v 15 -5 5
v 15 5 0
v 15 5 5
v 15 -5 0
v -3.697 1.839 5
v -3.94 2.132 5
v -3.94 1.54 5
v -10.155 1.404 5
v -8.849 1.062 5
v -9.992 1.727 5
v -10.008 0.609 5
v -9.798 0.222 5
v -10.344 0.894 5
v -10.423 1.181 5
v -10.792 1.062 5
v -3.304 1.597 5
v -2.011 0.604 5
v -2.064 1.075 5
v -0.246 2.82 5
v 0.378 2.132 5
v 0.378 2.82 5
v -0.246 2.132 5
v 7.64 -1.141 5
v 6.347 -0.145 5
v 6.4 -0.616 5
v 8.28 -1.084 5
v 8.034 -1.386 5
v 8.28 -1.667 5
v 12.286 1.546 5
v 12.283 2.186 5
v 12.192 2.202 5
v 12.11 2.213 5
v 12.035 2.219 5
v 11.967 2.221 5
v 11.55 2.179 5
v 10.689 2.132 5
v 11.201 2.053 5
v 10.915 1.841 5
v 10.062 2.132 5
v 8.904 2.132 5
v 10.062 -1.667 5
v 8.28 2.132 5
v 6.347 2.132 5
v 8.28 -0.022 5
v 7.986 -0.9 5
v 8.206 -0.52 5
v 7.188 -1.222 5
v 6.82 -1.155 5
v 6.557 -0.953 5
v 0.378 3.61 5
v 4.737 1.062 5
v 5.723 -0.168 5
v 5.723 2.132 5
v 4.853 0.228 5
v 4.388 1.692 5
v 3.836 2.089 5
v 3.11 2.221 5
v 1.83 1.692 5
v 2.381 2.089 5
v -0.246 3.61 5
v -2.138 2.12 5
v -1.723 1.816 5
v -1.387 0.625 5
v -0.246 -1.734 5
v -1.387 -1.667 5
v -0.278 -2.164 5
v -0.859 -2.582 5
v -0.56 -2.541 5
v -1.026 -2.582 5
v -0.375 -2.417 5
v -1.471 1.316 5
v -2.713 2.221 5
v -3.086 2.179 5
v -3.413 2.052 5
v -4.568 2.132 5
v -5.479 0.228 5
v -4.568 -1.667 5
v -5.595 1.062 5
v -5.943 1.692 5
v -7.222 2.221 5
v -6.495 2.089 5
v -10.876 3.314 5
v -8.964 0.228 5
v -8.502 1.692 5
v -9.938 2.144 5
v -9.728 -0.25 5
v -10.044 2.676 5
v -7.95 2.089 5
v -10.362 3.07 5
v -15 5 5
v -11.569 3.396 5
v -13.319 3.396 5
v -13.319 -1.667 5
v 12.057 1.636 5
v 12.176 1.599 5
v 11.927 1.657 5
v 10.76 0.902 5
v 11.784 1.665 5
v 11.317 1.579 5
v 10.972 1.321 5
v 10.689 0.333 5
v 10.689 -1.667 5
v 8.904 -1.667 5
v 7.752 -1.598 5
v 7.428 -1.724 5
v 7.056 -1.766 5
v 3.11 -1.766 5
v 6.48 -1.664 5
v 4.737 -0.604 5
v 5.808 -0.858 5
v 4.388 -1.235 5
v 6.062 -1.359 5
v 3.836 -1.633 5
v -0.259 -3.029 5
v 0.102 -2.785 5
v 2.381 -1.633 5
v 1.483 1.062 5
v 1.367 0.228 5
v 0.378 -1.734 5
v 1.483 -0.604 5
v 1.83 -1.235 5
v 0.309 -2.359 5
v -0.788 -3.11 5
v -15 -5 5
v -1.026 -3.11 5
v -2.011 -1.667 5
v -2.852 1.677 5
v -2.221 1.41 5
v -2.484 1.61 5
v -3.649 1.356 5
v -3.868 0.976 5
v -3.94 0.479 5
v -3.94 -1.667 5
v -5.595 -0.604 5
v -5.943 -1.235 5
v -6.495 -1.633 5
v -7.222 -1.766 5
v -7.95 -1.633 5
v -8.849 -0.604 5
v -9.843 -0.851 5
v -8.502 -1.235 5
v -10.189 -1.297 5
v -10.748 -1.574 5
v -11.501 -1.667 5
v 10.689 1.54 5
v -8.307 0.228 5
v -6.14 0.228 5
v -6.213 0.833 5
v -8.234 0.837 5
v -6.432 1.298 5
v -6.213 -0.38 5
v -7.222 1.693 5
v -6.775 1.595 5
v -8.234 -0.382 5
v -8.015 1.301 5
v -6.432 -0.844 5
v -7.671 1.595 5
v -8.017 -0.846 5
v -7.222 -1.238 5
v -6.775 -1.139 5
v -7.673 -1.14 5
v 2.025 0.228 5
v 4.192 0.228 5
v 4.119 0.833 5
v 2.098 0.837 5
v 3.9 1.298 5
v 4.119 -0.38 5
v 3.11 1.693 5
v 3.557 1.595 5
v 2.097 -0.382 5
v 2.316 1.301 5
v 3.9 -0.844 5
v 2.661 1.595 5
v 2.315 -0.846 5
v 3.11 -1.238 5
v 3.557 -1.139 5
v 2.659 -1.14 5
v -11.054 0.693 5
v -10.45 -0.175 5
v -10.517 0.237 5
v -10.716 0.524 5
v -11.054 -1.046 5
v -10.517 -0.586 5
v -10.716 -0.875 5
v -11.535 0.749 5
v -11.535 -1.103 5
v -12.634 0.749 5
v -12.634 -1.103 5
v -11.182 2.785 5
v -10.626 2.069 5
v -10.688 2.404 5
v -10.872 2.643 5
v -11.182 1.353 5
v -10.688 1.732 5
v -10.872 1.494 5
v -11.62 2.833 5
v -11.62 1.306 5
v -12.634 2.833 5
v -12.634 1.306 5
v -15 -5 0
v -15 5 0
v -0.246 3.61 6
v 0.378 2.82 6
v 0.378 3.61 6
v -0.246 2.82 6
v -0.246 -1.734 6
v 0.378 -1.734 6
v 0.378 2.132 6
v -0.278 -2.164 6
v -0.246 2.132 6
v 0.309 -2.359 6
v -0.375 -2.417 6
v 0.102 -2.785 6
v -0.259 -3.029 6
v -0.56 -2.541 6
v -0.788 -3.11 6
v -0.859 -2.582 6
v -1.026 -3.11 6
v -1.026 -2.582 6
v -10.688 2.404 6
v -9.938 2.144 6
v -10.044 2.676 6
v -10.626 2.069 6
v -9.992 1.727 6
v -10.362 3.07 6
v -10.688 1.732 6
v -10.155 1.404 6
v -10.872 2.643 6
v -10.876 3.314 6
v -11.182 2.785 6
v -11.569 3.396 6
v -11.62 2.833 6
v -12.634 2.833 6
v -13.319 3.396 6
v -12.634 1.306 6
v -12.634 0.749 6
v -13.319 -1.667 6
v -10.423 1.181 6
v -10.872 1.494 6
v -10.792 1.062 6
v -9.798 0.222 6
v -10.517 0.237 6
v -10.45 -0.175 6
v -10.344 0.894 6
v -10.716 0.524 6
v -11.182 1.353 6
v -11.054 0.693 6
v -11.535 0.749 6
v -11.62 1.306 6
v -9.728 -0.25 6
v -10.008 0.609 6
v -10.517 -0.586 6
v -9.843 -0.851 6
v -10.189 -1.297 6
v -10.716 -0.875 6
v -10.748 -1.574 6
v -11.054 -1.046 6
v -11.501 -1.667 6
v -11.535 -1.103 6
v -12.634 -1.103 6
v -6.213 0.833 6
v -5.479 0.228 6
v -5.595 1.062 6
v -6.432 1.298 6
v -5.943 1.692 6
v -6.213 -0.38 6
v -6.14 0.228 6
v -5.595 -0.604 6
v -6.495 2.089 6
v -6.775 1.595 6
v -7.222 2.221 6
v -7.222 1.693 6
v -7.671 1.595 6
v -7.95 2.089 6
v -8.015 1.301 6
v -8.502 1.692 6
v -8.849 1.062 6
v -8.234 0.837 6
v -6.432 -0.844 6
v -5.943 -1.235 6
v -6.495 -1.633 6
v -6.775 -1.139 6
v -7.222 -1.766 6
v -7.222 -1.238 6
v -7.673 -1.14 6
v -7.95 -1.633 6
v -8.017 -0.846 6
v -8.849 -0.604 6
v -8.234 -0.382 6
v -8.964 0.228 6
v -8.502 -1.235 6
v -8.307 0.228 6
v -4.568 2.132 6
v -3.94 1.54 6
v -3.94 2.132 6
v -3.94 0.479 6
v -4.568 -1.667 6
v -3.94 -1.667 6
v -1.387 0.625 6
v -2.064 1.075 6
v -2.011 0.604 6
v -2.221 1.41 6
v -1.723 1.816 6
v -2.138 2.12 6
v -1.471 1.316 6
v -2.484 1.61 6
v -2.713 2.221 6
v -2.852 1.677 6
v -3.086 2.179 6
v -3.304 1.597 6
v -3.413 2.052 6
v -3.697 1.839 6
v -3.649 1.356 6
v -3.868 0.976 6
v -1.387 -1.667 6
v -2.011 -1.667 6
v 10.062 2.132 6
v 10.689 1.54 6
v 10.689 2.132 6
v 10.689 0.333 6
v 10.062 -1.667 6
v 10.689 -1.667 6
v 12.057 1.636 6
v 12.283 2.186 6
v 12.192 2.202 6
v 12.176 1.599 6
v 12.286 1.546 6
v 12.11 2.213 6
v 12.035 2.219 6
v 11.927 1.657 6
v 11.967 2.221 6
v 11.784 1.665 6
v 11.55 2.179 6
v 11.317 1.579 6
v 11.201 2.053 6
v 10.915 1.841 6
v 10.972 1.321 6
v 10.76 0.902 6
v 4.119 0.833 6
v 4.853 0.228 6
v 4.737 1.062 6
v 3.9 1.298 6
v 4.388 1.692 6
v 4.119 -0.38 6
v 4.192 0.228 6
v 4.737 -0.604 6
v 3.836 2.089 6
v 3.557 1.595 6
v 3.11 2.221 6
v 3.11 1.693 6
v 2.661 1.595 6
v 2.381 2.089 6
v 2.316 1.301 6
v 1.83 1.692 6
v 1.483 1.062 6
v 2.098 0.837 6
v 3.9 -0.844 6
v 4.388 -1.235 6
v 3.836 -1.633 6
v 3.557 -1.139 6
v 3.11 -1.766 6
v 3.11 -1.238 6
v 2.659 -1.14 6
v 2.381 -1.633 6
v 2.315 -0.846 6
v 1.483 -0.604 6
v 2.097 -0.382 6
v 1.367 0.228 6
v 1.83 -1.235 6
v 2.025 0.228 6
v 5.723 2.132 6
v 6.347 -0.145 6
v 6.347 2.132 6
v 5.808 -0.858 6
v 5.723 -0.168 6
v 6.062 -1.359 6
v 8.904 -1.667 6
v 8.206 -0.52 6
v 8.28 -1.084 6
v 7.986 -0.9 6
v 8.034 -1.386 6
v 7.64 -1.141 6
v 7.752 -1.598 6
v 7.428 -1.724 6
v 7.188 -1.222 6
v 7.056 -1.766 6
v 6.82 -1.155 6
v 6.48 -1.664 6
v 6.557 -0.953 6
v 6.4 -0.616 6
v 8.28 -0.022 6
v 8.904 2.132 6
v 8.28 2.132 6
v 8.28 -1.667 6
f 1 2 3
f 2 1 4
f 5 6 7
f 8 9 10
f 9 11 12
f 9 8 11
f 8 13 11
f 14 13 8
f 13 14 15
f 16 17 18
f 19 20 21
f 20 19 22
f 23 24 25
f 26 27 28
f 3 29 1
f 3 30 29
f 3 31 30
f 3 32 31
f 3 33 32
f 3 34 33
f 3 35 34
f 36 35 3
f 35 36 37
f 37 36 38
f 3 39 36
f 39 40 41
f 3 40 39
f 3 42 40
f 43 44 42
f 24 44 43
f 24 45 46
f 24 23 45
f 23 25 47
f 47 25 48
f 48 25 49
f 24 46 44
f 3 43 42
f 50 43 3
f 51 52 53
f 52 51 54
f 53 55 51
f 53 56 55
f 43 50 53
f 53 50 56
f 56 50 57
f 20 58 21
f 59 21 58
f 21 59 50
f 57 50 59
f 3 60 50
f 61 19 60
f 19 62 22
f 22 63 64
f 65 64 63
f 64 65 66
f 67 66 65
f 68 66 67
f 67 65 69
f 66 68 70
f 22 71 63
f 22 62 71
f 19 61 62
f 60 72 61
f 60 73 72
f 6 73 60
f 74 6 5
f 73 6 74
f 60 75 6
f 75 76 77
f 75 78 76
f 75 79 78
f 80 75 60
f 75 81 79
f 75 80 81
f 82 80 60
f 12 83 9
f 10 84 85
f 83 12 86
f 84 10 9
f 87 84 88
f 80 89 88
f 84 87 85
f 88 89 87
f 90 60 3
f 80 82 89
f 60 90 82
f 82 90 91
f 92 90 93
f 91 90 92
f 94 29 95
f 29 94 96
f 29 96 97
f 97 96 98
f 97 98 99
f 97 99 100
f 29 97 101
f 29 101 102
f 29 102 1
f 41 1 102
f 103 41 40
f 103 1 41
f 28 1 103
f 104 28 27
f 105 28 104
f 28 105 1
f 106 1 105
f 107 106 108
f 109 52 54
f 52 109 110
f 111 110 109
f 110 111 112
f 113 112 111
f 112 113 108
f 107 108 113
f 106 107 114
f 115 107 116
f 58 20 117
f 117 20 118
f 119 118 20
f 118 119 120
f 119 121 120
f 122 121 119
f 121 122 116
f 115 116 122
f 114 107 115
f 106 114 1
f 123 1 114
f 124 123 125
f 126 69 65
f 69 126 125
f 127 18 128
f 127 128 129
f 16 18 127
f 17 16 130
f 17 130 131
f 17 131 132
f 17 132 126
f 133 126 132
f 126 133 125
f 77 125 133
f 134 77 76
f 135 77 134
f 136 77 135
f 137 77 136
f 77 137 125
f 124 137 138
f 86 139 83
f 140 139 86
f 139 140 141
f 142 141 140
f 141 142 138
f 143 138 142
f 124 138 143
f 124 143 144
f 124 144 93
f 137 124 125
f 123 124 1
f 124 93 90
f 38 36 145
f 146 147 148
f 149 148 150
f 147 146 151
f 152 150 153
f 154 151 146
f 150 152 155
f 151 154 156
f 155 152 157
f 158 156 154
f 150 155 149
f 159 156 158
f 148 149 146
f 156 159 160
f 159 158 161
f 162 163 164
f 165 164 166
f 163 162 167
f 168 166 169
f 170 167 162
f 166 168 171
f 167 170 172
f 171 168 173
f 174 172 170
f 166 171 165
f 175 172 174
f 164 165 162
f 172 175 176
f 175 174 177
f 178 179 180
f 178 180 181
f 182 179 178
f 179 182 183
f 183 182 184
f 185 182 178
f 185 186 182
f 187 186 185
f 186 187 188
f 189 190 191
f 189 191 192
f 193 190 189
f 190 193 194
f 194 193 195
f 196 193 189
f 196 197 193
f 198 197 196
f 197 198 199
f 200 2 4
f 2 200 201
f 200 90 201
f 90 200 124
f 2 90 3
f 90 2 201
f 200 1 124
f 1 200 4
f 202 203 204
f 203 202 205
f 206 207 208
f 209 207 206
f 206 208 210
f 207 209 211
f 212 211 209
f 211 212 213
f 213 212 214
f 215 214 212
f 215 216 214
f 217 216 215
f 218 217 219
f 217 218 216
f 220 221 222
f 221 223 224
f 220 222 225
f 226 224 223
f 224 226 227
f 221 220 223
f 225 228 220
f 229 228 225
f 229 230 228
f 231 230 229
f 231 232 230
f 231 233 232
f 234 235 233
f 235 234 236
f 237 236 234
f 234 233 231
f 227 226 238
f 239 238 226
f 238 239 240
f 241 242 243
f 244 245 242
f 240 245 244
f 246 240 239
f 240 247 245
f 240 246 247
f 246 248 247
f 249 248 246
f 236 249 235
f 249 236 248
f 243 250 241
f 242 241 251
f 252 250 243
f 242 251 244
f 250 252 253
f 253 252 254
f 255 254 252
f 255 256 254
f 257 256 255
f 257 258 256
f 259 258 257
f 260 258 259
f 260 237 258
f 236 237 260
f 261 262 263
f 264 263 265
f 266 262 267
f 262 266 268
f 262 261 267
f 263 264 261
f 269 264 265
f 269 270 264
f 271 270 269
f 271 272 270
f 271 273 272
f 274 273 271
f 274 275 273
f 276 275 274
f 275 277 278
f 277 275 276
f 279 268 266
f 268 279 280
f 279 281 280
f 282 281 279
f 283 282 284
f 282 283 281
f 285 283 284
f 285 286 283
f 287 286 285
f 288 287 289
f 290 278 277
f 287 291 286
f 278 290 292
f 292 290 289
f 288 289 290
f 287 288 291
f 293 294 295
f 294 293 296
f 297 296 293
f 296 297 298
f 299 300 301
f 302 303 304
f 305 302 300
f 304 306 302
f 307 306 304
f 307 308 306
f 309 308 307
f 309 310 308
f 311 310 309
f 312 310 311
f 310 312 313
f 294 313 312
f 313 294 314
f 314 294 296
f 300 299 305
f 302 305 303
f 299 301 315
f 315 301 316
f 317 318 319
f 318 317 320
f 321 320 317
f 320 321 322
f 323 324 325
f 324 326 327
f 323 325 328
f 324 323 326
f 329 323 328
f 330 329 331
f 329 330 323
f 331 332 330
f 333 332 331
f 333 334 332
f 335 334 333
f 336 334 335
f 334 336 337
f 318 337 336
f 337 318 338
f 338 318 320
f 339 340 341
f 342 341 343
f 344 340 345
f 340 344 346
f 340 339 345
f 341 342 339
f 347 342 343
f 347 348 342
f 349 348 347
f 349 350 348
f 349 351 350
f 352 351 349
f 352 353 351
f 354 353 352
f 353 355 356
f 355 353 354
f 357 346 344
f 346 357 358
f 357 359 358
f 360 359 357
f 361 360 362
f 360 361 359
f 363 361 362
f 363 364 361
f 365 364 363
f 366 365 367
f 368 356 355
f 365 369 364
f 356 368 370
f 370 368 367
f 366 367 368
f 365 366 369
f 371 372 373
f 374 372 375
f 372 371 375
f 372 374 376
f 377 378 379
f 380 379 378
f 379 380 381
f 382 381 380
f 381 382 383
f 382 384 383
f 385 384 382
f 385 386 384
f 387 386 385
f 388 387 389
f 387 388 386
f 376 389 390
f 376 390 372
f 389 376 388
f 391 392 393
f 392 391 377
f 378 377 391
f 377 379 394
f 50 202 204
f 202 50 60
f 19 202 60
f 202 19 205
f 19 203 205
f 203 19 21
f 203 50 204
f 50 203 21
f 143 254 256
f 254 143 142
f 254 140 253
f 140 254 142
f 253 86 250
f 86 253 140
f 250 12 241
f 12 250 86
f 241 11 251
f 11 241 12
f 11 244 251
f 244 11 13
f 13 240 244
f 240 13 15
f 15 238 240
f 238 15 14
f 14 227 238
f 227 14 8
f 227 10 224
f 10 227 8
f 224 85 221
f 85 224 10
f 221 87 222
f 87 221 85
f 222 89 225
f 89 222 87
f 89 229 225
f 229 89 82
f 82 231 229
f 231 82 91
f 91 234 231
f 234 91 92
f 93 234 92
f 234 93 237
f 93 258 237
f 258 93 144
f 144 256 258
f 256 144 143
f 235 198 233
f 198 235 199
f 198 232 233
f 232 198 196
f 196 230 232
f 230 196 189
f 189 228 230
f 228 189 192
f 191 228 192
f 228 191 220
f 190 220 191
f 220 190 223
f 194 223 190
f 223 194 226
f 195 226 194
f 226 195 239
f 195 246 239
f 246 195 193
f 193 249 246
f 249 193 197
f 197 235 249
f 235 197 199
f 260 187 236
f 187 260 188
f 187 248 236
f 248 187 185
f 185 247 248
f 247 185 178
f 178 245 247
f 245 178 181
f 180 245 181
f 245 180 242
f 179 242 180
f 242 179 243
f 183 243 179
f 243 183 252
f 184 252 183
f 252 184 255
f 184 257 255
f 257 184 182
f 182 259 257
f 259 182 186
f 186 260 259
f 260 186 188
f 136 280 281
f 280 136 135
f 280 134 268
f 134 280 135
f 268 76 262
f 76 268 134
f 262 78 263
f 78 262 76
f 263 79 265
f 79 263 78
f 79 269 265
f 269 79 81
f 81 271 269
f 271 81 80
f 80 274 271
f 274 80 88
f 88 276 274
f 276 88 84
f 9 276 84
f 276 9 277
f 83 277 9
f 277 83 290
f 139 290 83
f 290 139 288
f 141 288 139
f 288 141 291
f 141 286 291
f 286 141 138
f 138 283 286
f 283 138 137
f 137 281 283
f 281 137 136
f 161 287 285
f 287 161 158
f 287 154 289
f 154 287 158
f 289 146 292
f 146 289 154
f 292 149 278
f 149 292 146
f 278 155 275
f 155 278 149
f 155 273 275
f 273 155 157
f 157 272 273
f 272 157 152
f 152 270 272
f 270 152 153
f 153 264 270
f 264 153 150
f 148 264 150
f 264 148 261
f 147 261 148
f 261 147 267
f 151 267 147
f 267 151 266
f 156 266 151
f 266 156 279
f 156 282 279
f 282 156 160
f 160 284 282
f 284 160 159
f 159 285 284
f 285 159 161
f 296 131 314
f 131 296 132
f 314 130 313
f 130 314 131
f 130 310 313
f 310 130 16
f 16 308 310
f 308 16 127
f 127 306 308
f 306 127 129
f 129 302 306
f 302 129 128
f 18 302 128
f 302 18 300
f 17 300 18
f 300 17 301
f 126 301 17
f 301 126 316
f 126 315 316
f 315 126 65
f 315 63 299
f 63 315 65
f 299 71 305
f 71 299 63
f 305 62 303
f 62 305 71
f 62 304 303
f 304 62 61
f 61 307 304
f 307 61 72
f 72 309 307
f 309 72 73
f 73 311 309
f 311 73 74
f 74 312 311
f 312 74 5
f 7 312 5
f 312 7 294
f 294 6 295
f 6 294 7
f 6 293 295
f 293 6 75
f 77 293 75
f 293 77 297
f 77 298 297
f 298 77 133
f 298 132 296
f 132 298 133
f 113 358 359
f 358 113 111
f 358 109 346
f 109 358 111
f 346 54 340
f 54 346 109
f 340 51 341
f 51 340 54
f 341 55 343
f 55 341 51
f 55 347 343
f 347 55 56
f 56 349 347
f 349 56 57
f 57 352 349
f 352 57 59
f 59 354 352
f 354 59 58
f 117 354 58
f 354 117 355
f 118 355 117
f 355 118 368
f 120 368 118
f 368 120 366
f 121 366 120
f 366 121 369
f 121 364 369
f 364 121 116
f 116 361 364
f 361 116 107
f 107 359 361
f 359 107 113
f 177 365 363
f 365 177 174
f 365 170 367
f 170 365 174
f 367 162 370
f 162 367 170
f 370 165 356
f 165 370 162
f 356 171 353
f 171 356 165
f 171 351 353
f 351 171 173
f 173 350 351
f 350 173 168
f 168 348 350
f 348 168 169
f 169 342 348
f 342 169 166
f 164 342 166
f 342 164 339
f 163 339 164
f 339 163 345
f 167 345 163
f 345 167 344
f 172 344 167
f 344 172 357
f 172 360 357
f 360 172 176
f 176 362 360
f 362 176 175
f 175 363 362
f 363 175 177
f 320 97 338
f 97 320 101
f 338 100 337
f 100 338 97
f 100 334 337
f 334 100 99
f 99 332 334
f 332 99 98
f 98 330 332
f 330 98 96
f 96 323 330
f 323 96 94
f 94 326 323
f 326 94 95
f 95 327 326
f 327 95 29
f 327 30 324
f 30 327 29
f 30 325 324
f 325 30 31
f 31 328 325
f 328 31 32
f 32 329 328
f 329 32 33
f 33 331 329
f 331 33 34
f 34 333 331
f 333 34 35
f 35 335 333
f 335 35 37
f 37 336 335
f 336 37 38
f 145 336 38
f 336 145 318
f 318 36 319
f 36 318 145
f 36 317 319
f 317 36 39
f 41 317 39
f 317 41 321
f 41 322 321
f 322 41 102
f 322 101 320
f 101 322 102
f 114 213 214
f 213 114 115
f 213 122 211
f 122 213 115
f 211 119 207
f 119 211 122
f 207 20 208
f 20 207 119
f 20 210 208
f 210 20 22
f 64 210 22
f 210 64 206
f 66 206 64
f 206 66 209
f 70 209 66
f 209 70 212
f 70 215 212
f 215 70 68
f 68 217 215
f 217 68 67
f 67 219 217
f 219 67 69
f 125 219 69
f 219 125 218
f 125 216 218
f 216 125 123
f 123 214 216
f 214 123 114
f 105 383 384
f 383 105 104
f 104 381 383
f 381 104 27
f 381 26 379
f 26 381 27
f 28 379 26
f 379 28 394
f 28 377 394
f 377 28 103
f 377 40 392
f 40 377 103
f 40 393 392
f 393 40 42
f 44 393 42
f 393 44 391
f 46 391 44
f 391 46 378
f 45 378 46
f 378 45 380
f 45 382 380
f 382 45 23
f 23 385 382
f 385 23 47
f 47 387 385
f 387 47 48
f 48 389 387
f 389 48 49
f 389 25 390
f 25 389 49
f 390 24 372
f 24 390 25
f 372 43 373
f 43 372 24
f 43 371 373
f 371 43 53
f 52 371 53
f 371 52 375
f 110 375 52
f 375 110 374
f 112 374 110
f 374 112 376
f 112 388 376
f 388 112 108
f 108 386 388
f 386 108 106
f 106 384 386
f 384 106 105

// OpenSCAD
$fn = 10; 
texte_a_inserer = "Bonjour"; 
taille = 5; 
police = "DejaVuSans"; //[[Abril Fatface,Aclonica,Acme,Advent Pro,Akronim,Aladin,Alegreya,Alegreya Sans,Alegreya SC,Alex Brush,Alfa Slab One,Alice,Amaranth,Architects Daughter,Archivo Black,Archivo Narrow,Arimo,Arvo,Asap,Astloch,Asul,Averia Libre,Averia Serif Libre,Bangers,Basic,Belgrano,Berkshire Swash,Bigshot One,Bilbo Swash Caps,Black Ops One,Bonbon,Bowlby One SC,Brawler,Bubblegum Sans,Butterfly Kids,Cabin Condensed,Caesar Dressing,Cagliostro,Calligraffitti,Capriola,Carter One,Changa One,Chango,Chelsea Market,Cherry Cream Soda,Chewy,Chicle,Chivo,Clicker Script,Coming Soon,Concert One,Condiment,Cookie,Courgette,Covered By Your Grace,Crimson Text,Dancing Script,DejaVu Sans,DejaVu Serif,Dhurjati,Doppio One,Dosis,Droid Sans,Eagle Lake,Electrolize,Emilys Candy,Encode Sans,Encode Sans Compressed,Euphoria Script,Exo,Exo 2,Faster One,Federo,Finger Paint,Fjord One,Fontdiner Swanky,Freckle Face,Fruktur,Gabriela,Geo,Germania One,Give You Glory,Gloria Hallelujah,Goudy Bookletter 1911,Graduate,Grand Hotel,Great Vibes,Griffy,Hanalei Fill,Happy Monkey,Henny Penny,Hind,IM Fell English SC,Indie Flower,Irish Grover,Italianno,Jacques Francois Shadow,Jolly Lodger,Josefin Slab,Joti One,Judson,Just Another Hand,Kalam,Kameron,Karma,Kavoon,Knewave,Kranky,Kristi,Laila,Lakki Reddy,Lancelot,Lato,Leckerli One,Ledger,Lekton,Lemon One,Liberation Sans,Libre Caslon Text,Life Savers,Lilita One,Lily Script One,Limelight,Lobster,Lobster Two,Londrina Outline,Londrina Shadow,Londrina Solid,Lora,Love Ya Like A Sister,Loved by the King,Lovers Quarrel,Luckiest Guy,Lusitana,Macondo,Macondo Swash Caps,Mako,Marck Script,Margarine,Marko One,Maven Pro,McLaren,MedievalSharp,Merienda One,Merriweather,Mervale Script,Metal Mania,Metrophobic,Milonga,Miltonian Tattoo,Miss Fajardose,Molle,Montez,Montserrat,Mr De Haviland,Mystery Quest,Neucha,New Rocker,Niconne,Nosifer,Nothing You Could Do,Noto Sans Oriya,Noto Serif,Nova Square,Nunito,Old Standard TT,Oleo Script,Oleo Script Swash Caps,Orbitron,Oregano,Orienta,Original Surfer,Oswald,Over the Rainbow,Overlock,Oxygen,Pacifico,Paprika,Parisienne,Patrick Hand SC,Paytone One,Peralta,Permanent Marker,Piedra,Pirata One,Play,Playball,Poetsen One,Poppins,Press Start 2P,Princess Sofia,PT Mono,Qwigley,Racing Sans One,Raleway,Rancho,Ranga,Ribeye,Roboto,Roboto Condensed,Roboto Slab,Rochester,Rock Salt,Rubik One,Sail,Salsa,Sansita One,Sarina,Satisfy,Schoolbell,Seaweed Script,Sevillana,Shadows Into Light,Shadows Into Light Two,Share,Six Caps,Skranji,Source Sans Pro,Spicy Rice,Stardos Stencil,Stoke,Syncopate,Teko,Terminal Dosis,The Girl Next Door,Tillana,Timmana,Titillium Web,Ubuntu,Ultra,Underdog,UnifrakturCook,UnifrakturMaguntia,Vampiro One,Vidaloka,Viga,Voces,Volkhov,Vollkorn,Voltaire,Waiting for the Sunrise,Wallpoet,Wellfleet,Wendy One,Yellowtail,Yesteryear,Zeyada]]
hauteur = 1; 
longueur_cube = 30; 
largeur_cube = 10; 
hauteur_cube = 5; 
// relief = relief  extrusion = extru
relief = "relief"; //[relief,extru]
module rendu(){
linear_extrude(hauteur) text(texte_a_inserer,size = taille, font = police);
}
module finao(){
if ( relief== "relief") {
   union(){
 translate([0,0,0])   cube([longueur_cube,largeur_cube,hauteur_cube]);
translate([1,(largeur_cube/3),hauteur_cube]) rendu();
   } 
}
else
{
difference(){
 translate([0,0,0])   cube([longueur_cube,largeur_cube,hauteur_cube]);
translate([1,(largeur_cube/3),(hauteur_cube -hauteur+0.1)]) rendu();
}
 }
}
translate ([-(longueur_cube/2),-(largeur_cube/2),0]) finao();
